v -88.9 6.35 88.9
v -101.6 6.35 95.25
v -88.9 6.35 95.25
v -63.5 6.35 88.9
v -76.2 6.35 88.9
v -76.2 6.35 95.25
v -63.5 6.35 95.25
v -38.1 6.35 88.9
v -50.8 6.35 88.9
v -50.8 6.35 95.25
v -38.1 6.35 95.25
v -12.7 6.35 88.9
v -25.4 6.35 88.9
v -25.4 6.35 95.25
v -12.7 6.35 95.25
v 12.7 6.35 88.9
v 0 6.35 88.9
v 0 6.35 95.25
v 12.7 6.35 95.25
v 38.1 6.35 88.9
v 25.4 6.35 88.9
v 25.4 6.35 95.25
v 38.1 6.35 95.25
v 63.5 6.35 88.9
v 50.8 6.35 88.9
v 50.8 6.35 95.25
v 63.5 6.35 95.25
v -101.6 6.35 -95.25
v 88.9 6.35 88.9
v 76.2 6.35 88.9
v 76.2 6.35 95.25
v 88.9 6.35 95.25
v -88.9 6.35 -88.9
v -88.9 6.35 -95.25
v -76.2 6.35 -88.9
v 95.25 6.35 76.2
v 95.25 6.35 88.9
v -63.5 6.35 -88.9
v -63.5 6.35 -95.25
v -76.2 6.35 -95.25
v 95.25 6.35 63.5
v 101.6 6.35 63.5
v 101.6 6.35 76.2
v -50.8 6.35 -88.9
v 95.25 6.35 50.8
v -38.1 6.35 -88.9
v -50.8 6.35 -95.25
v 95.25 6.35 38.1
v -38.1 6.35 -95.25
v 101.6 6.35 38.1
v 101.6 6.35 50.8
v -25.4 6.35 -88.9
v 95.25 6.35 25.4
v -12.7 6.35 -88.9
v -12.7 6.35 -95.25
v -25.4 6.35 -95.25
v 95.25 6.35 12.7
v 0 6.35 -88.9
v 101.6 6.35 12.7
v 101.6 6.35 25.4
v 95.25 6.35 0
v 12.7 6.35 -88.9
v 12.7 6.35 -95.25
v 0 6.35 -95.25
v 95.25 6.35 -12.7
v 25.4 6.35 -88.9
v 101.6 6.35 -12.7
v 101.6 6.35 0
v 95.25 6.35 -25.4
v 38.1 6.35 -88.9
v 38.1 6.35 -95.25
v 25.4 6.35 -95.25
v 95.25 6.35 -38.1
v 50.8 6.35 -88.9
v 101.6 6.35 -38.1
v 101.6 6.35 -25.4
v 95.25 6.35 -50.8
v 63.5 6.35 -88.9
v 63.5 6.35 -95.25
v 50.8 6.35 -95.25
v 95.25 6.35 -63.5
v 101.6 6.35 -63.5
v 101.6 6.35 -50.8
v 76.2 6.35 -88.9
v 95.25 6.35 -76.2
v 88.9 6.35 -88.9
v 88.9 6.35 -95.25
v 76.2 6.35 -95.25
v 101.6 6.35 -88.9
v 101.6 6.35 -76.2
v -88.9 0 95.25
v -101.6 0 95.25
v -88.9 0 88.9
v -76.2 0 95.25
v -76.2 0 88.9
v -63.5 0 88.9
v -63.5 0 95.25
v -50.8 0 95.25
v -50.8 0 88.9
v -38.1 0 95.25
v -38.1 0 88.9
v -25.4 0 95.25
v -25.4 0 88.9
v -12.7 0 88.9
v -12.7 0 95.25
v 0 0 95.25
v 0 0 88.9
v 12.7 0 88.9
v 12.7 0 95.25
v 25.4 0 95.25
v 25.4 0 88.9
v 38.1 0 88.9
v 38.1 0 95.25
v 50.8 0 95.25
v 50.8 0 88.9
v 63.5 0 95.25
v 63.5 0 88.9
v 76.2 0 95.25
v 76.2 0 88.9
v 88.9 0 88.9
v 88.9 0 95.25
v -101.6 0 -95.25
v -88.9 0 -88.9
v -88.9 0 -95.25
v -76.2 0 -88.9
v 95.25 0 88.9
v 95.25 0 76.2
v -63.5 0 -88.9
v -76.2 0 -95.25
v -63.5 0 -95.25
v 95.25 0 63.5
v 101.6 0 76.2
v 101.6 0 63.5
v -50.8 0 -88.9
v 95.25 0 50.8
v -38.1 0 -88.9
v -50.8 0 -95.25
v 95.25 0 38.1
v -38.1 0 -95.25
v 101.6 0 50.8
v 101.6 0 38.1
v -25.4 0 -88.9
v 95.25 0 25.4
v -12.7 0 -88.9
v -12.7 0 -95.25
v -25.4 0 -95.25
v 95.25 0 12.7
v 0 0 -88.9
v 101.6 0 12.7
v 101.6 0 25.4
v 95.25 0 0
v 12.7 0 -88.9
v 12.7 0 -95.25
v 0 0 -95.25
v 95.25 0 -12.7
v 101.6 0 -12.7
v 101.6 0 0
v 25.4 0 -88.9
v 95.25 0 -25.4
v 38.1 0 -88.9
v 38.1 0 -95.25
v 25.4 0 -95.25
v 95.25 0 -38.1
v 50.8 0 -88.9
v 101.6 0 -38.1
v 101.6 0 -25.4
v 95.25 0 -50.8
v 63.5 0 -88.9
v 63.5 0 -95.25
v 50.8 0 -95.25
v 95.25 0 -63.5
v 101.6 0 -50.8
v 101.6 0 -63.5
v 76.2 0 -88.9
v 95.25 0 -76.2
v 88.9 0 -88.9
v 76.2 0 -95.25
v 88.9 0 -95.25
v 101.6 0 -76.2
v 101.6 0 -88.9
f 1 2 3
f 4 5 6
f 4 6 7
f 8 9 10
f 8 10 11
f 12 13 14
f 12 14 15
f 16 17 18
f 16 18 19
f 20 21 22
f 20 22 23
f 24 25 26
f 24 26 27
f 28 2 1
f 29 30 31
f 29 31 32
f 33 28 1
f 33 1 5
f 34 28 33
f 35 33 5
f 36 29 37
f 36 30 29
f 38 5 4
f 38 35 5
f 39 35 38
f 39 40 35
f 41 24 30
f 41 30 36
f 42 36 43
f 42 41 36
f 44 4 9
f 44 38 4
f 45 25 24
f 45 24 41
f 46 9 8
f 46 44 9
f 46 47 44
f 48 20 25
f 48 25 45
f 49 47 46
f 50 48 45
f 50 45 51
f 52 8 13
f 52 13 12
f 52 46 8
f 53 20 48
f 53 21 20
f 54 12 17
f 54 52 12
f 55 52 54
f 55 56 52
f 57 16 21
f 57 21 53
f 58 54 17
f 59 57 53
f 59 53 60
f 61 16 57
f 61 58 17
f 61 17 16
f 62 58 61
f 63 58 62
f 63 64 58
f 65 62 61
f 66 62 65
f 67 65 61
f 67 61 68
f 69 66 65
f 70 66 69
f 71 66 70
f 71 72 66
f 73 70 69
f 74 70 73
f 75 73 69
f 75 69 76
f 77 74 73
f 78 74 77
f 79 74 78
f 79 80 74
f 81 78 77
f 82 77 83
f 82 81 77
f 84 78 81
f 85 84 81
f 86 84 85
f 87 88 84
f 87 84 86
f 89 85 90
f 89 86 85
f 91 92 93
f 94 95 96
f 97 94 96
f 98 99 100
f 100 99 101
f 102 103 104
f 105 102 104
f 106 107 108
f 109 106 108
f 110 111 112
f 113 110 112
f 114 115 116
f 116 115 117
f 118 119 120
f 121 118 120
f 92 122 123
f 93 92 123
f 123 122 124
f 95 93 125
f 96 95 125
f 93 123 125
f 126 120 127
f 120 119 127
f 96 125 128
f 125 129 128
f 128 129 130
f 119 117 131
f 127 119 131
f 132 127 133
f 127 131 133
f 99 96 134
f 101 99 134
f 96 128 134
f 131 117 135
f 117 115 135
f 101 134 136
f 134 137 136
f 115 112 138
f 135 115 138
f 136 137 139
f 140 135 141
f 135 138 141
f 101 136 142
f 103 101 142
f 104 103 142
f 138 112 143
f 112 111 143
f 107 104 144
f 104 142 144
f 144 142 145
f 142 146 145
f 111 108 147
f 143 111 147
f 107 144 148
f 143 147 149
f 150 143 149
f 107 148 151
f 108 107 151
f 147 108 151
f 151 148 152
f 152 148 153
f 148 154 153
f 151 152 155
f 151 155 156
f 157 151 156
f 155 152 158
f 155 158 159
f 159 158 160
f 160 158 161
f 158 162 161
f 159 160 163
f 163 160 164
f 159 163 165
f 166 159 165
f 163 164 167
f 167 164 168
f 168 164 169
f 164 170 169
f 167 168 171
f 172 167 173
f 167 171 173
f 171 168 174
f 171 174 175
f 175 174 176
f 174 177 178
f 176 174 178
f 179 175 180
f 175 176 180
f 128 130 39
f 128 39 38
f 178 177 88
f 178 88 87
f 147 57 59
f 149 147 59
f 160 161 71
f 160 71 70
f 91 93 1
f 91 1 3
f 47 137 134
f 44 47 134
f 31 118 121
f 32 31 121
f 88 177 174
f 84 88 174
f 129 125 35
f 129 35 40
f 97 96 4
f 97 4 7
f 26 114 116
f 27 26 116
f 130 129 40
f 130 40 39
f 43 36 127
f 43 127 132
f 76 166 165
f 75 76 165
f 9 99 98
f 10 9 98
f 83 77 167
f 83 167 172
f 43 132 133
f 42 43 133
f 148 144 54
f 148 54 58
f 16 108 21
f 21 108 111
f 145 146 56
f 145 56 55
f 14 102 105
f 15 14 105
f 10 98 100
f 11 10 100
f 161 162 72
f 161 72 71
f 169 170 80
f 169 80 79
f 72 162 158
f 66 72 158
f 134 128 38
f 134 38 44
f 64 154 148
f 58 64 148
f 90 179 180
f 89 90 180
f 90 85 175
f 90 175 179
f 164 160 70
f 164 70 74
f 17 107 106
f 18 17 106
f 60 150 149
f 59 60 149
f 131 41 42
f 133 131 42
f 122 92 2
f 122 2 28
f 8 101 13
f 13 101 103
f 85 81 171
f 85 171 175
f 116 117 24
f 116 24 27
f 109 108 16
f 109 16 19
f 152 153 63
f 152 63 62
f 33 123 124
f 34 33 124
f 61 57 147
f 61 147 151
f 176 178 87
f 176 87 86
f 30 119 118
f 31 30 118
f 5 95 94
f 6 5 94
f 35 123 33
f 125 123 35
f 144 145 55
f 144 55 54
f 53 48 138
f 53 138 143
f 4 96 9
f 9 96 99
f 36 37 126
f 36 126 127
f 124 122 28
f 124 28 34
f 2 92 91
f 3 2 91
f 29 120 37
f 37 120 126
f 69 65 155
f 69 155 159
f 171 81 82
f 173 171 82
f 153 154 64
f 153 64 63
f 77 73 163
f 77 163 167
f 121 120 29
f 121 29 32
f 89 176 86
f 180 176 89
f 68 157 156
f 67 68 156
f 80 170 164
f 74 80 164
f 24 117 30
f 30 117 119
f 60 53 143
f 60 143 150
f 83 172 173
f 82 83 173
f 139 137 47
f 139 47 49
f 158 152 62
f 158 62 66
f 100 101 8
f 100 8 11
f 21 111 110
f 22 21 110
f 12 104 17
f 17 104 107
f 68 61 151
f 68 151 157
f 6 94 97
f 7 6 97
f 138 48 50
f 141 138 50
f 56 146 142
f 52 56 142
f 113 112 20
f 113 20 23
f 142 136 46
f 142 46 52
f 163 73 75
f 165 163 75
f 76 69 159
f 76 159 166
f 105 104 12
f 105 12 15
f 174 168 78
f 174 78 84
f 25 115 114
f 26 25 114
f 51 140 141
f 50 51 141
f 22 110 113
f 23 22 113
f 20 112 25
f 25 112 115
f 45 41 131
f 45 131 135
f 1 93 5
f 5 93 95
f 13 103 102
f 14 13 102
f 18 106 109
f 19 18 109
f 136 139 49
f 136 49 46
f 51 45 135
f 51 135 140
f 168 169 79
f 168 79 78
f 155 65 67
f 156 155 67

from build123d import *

# Parameters (mm, degrees)
SKETCH1_W               = 203.2
SKETCH1_H               = 190.5
BOSS_EXTRUDE1_DEPTH     = 6.35
SKETCH2_W               = 12.7
SKETCH2_H               = 6.35
CUT_EXTRUDE1_DEPTH      = 7.35
LPATTERN1_COUNT         = 8
LPATTERN1_PITCH         = 25.4
MIRROR1_COPY_1_SKETCH_W = 12.7
MIRROR1_COPY_1_SKETCH_H = 6.35
MIRROR1_COPY_1_DEPTH    = 7.35
MIRROR1_COPY_2_SKETCH_W = 12.7
MIRROR1_COPY_2_SKETCH_H = 6.35
MIRROR1_COPY_2_DEPTH    = 7.35
MIRROR1_COPY_3_SKETCH_W = 12.7
MIRROR1_COPY_3_SKETCH_H = 6.35
MIRROR1_COPY_3_DEPTH    = 7.35
MIRROR1_COPY_4_SKETCH_W = 12.7
MIRROR1_COPY_4_SKETCH_H = 6.35
MIRROR1_COPY_4_DEPTH    = 7.35
MIRROR1_COPY_5_SKETCH_W = 12.7
MIRROR1_COPY_5_SKETCH_H = 6.35
MIRROR1_COPY_5_DEPTH    = 7.35
MIRROR1_COPY_6_SKETCH_W = 12.7
MIRROR1_COPY_6_SKETCH_H = 6.35
MIRROR1_COPY_6_DEPTH    = 7.35
MIRROR1_COPY_7_SKETCH_W = 12.7
MIRROR1_COPY_7_SKETCH_H = 6.35
MIRROR1_COPY_7_DEPTH    = 7.35
SKETCH4_W               = 6.35
SKETCH4_H               = 12.7
CUT_EXTRUDE2_DEPTH      = 7.35
LPATTERN2_COUNT         = 7
LPATTERN2_PITCH         = 25.4


with BuildPart() as part:
    # Sketch1 → Boss-Extrude1 (new body)
    with BuildSketch(Plane(origin=(0, 0, 0), x_dir=(1, 0, 0), z_dir=(0, 1, 0))):
        Rectangle(SKETCH1_W, SKETCH1_H)
    extrude(amount=BOSS_EXTRUDE1_DEPTH)

    # Sketch2 → Cut-Extrude1 (cut, through all)
    with BuildSketch(Plane.XZ):
        with Locations((-82.55, 92.075)):
            Rectangle(SKETCH2_W, SKETCH2_H)
    cut_extrude1 = extrude(amount=-CUT_EXTRUDE1_DEPTH, mode=Mode.SUBTRACT)

    # LPattern1: Cut-Extrude1 ×8
    with Locations(*[(i * LPATTERN1_PITCH, 0, 0) for i in range(1, LPATTERN1_COUNT)]):
        add(cut_extrude1, mode=Mode.SUBTRACT)

    # Mirror1: Cut-Extrude1 across plane
    add(cut_extrude1.mirror(Plane.XY), mode=Mode.SUBTRACT)

    # Mirror1 copy 1 sketch → Mirror1 copy 1 (cut, through all)
    with BuildSketch(Plane(origin=(25.4, 0, 0), x_dir=(1, 0, 0), z_dir=(0, -1, 0))):
        with Locations((-82.55, -92.075)):
            Rectangle(MIRROR1_COPY_1_SKETCH_W, MIRROR1_COPY_1_SKETCH_H)
    extrude(amount=-MIRROR1_COPY_1_DEPTH, mode=Mode.SUBTRACT)

    # Mirror1 copy 2 sketch → Mirror1 copy 2 (cut, through all)
    with BuildSketch(Plane(origin=(50.8, 0, 0), x_dir=(1, 0, 0), z_dir=(0, -1, 0))):
        with Locations((-82.55, -92.075)):
            Rectangle(MIRROR1_COPY_2_SKETCH_W, MIRROR1_COPY_2_SKETCH_H)
    extrude(amount=-MIRROR1_COPY_2_DEPTH, mode=Mode.SUBTRACT)

    # Mirror1 copy 3 sketch → Mirror1 copy 3 (cut, through all)
    with BuildSketch(Plane(origin=(76.2, 0, 0), x_dir=(1, 0, 0), z_dir=(0, -1, 0))):
        with Locations((-82.55, -92.075)):
            Rectangle(MIRROR1_COPY_3_SKETCH_W, MIRROR1_COPY_3_SKETCH_H)
    extrude(amount=-MIRROR1_COPY_3_DEPTH, mode=Mode.SUBTRACT)

    # Mirror1 copy 4 sketch → Mirror1 copy 4 (cut, through all)
    with BuildSketch(Plane(origin=(101.6, 0, 0), x_dir=(1, 0, 0), z_dir=(0, -1, 0))):
        with Locations((-82.55, -92.075)):
            Rectangle(MIRROR1_COPY_4_SKETCH_W, MIRROR1_COPY_4_SKETCH_H)
    extrude(amount=-MIRROR1_COPY_4_DEPTH, mode=Mode.SUBTRACT)

    # Mirror1 copy 5 sketch → Mirror1 copy 5 (cut, through all)
    with BuildSketch(Plane(origin=(127, 0, 0), x_dir=(1, 0, 0), z_dir=(0, -1, 0))):
        with Locations((-82.55, -92.075)):
            Rectangle(MIRROR1_COPY_5_SKETCH_W, MIRROR1_COPY_5_SKETCH_H)
    extrude(amount=-MIRROR1_COPY_5_DEPTH, mode=Mode.SUBTRACT)

    # Mirror1 copy 6 sketch → Mirror1 copy 6 (cut, through all)
    with BuildSketch(Plane(origin=(152.4, 0, 0), x_dir=(1, 0, 0), z_dir=(0, -1, 0))):
        with Locations((-82.55, -92.075)):
            Rectangle(MIRROR1_COPY_6_SKETCH_W, MIRROR1_COPY_6_SKETCH_H)
    extrude(amount=-MIRROR1_COPY_6_DEPTH, mode=Mode.SUBTRACT)

    # Mirror1 copy 7 sketch → Mirror1 copy 7 (cut, through all)
    with BuildSketch(Plane(origin=(177.8, 0, 0), x_dir=(1, 0, 0), z_dir=(0, -1, 0))):
        with Locations((-82.55, -92.075)):
            Rectangle(MIRROR1_COPY_7_SKETCH_W, MIRROR1_COPY_7_SKETCH_H)
    extrude(amount=-MIRROR1_COPY_7_DEPTH, mode=Mode.SUBTRACT)

    # Sketch4 → Cut-Extrude2 (cut, through all)
    with BuildSketch(Plane(origin=(0, 6.35, 0), x_dir=(1, 0, 0), z_dir=(0, 1, 0))):
        with Locations((98.425, 69.85)):
            Rectangle(SKETCH4_W, SKETCH4_H)
    cut_extrude2 = extrude(amount=-CUT_EXTRUDE2_DEPTH, mode=Mode.SUBTRACT)

    # LPattern2: Cut-Extrude2 ×7
    with Locations(*[(0, 0, i * LPATTERN2_PITCH) for i in range(1, LPATTERN2_COUNT)]):
        add(cut_extrude2, mode=Mode.SUBTRACT)


solid = part.part
